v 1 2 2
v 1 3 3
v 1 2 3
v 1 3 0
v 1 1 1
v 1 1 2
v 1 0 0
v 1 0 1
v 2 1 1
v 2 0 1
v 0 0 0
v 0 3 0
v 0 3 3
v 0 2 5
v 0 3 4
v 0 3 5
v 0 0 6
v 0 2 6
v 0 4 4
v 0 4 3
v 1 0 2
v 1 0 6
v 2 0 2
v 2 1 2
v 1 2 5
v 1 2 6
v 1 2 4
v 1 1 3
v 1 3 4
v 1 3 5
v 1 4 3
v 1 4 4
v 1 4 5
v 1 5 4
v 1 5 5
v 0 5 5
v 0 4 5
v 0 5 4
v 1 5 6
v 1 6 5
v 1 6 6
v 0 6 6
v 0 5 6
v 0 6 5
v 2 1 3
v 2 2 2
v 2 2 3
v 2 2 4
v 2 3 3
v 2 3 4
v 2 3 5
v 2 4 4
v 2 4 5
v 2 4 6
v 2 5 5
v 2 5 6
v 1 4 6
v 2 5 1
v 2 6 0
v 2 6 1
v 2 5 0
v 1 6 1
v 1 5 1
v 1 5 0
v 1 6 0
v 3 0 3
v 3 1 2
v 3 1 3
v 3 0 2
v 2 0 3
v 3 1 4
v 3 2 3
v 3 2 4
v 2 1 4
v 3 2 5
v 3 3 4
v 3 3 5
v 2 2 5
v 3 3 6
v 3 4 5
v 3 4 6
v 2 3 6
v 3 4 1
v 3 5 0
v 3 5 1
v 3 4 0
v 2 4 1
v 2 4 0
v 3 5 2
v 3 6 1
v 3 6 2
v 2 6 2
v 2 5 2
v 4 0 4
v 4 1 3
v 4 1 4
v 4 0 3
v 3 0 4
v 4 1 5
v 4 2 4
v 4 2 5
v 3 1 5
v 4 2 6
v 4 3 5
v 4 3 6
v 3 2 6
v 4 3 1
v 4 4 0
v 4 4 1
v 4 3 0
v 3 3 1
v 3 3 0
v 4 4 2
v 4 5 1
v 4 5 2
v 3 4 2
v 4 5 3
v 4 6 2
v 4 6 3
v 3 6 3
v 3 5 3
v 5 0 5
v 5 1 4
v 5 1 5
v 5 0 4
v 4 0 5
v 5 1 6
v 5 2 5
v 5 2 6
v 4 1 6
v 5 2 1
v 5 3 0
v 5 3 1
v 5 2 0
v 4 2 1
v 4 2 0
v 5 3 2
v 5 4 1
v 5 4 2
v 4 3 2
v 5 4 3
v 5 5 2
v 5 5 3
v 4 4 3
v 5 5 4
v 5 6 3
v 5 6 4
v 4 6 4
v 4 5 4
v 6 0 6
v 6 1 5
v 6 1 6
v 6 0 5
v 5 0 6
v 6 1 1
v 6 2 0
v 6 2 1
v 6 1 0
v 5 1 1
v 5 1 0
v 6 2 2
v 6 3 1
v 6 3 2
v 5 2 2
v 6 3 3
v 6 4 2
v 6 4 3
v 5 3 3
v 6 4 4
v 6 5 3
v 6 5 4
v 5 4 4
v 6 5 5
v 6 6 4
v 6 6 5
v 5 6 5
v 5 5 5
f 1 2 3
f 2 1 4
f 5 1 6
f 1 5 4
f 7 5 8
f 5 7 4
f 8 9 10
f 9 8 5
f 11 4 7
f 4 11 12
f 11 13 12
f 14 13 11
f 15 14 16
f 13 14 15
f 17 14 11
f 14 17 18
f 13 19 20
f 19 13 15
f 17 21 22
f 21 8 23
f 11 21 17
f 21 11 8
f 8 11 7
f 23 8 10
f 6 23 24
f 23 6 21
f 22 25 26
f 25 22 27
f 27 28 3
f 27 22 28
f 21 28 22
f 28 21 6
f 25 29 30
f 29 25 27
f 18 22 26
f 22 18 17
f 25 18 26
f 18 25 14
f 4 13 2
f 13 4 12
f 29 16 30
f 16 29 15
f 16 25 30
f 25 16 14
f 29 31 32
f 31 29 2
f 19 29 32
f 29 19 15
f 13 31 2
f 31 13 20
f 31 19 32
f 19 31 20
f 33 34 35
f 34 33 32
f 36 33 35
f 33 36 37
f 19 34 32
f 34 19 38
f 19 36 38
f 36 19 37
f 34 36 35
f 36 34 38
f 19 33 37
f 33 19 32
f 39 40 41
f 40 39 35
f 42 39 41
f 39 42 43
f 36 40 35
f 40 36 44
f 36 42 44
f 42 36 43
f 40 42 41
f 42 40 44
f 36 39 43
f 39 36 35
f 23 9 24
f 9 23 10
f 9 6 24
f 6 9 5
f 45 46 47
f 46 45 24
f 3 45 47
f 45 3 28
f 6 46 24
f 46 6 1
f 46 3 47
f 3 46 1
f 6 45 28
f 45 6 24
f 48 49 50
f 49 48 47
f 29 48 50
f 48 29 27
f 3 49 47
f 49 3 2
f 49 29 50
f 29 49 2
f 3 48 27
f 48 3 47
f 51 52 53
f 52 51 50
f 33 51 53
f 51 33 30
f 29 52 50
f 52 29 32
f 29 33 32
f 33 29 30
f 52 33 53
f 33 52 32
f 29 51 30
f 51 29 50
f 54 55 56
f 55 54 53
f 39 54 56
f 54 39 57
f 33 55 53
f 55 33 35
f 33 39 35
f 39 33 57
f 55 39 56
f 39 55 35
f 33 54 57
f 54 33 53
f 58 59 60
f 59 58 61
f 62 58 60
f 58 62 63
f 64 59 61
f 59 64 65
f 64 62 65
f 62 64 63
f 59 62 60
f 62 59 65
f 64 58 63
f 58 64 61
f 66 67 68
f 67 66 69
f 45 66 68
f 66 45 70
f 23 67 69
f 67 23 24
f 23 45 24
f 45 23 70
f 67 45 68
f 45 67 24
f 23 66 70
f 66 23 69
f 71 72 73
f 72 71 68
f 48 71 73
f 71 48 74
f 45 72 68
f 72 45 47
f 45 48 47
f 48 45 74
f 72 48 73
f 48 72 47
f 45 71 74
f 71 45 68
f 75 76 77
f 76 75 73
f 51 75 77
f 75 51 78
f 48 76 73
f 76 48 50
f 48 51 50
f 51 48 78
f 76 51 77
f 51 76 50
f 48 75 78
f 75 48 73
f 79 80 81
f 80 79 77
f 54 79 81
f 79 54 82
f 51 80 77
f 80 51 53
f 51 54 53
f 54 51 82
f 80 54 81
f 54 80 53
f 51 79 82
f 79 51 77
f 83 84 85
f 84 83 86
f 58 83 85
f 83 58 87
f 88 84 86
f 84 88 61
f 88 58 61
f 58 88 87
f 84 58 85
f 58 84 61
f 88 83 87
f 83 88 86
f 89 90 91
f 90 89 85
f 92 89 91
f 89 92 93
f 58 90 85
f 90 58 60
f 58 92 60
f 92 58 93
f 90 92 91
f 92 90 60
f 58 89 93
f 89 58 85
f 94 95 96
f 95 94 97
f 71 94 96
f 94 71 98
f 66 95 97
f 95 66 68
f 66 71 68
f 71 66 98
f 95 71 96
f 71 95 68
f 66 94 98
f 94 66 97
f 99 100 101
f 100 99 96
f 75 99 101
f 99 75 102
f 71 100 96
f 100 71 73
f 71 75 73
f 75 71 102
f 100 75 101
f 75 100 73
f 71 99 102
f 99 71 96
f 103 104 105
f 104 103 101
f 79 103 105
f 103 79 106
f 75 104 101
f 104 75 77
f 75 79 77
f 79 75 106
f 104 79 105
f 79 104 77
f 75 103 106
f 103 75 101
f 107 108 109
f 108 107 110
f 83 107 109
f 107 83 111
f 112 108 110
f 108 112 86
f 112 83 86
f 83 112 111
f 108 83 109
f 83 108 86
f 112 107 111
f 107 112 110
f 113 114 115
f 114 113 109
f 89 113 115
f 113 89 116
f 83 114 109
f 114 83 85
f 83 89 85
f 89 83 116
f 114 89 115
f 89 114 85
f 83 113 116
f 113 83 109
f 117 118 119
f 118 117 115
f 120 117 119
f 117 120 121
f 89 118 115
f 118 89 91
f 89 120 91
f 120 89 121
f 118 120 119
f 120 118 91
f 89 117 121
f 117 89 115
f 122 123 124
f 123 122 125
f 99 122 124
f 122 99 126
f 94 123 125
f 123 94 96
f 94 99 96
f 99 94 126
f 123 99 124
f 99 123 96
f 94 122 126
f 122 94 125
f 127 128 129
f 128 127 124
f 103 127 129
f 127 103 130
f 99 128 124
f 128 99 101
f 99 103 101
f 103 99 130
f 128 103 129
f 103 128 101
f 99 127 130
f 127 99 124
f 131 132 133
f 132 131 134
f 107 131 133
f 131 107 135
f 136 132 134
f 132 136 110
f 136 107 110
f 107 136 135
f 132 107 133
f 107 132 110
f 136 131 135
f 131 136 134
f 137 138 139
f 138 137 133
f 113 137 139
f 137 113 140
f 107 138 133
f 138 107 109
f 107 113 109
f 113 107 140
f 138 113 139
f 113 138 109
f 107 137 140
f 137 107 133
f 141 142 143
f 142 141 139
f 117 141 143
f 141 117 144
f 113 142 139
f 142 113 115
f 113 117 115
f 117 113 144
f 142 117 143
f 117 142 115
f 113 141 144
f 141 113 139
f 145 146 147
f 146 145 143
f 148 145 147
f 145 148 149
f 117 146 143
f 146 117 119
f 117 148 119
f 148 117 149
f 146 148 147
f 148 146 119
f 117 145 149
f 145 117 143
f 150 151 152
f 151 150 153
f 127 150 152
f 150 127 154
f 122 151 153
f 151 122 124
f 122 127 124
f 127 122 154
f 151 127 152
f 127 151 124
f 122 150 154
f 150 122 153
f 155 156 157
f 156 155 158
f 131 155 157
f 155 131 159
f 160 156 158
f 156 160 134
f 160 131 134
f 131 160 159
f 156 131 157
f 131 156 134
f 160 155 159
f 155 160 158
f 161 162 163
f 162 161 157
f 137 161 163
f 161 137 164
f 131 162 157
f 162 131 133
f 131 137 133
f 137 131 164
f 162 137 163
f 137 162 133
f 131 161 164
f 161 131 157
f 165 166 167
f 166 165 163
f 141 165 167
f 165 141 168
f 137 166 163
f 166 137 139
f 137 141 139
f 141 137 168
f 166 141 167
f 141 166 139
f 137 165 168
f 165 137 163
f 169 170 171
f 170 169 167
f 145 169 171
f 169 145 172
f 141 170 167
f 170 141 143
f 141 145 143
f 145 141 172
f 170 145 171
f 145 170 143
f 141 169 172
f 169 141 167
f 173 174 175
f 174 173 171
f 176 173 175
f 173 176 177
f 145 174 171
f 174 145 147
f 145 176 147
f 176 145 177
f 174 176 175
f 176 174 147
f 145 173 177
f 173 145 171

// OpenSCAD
union() {
    translate([0, 0, 0]) cube([1, 1, 1]);
    translate([0, 0, 1]) cube([1, 1, 1]);
    translate([0, 0, 2]) cube([1, 1, 1]);
    translate([0, 0, 3]) cube([1, 1, 1]);
    translate([0, 0, 4]) cube([1, 1, 1]);
    translate([0, 0, 5]) cube([1, 1, 1]);
    translate([0, 1, 0]) cube([1, 1, 1]);
    translate([0, 1, 1]) cube([1, 1, 1]);
    translate([0, 1, 2]) cube([1, 1, 1]);
    translate([0, 1, 3]) cube([1, 1, 1]);
    translate([0, 1, 4]) cube([1, 1, 1]);
    translate([0, 1, 5]) cube([1, 1, 1]);
    translate([0, 2, 0]) cube([1, 1, 1]);
    translate([0, 2, 1]) cube([1, 1, 1]);
    translate([0, 2, 2]) cube([1, 1, 1]);
    translate([0, 2, 3]) cube([1, 1, 1]);
    translate([0, 2, 4]) cube([1, 1, 1]);
    translate([0, 3, 3]) cube([1, 1, 1]);
    translate([0, 4, 4]) cube([1, 1, 1]);
    translate([0, 5, 5]) cube([1, 1, 1]);
    translate([1, 0, 1]) cube([1, 1, 1]);
    translate([1, 1, 2]) cube([1, 1, 1]);
    translate([1, 2, 3]) cube([1, 1, 1]);
    translate([1, 3, 4]) cube([1, 1, 1]);
    translate([1, 4, 5]) cube([1, 1, 1]);
    translate([1, 5, 0]) cube([1, 1, 1]);
    translate([2, 0, 2]) cube([1, 1, 1]);
    translate([2, 1, 3]) cube([1, 1, 1]);
    translate([2, 2, 4]) cube([1, 1, 1]);
    translate([2, 3, 5]) cube([1, 1, 1]);
    translate([2, 4, 0]) cube([1, 1, 1]);
    translate([2, 5, 1]) cube([1, 1, 1]);
    translate([3, 0, 3]) cube([1, 1, 1]);
    translate([3, 1, 4]) cube([1, 1, 1]);
    translate([3, 2, 5]) cube([1, 1, 1]);
    translate([3, 3, 0]) cube([1, 1, 1]);
    translate([3, 4, 1]) cube([1, 1, 1]);
    translate([3, 5, 2]) cube([1, 1, 1]);
    translate([4, 0, 4]) cube([1, 1, 1]);
    translate([4, 1, 5]) cube([1, 1, 1]);
    translate([4, 2, 0]) cube([1, 1, 1]);
    translate([4, 3, 1]) cube([1, 1, 1]);
    translate([4, 4, 2]) cube([1, 1, 1]);
    translate([4, 5, 3]) cube([1, 1, 1]);
    translate([5, 0, 5]) cube([1, 1, 1]);
    translate([5, 1, 0]) cube([1, 1, 1]);
    translate([5, 2, 1]) cube([1, 1, 1]);
    translate([5, 3, 2]) cube([1, 1, 1]);
    translate([5, 4, 3]) cube([1, 1, 1]);
    translate([5, 5, 4]) cube([1, 1, 1]);
}
